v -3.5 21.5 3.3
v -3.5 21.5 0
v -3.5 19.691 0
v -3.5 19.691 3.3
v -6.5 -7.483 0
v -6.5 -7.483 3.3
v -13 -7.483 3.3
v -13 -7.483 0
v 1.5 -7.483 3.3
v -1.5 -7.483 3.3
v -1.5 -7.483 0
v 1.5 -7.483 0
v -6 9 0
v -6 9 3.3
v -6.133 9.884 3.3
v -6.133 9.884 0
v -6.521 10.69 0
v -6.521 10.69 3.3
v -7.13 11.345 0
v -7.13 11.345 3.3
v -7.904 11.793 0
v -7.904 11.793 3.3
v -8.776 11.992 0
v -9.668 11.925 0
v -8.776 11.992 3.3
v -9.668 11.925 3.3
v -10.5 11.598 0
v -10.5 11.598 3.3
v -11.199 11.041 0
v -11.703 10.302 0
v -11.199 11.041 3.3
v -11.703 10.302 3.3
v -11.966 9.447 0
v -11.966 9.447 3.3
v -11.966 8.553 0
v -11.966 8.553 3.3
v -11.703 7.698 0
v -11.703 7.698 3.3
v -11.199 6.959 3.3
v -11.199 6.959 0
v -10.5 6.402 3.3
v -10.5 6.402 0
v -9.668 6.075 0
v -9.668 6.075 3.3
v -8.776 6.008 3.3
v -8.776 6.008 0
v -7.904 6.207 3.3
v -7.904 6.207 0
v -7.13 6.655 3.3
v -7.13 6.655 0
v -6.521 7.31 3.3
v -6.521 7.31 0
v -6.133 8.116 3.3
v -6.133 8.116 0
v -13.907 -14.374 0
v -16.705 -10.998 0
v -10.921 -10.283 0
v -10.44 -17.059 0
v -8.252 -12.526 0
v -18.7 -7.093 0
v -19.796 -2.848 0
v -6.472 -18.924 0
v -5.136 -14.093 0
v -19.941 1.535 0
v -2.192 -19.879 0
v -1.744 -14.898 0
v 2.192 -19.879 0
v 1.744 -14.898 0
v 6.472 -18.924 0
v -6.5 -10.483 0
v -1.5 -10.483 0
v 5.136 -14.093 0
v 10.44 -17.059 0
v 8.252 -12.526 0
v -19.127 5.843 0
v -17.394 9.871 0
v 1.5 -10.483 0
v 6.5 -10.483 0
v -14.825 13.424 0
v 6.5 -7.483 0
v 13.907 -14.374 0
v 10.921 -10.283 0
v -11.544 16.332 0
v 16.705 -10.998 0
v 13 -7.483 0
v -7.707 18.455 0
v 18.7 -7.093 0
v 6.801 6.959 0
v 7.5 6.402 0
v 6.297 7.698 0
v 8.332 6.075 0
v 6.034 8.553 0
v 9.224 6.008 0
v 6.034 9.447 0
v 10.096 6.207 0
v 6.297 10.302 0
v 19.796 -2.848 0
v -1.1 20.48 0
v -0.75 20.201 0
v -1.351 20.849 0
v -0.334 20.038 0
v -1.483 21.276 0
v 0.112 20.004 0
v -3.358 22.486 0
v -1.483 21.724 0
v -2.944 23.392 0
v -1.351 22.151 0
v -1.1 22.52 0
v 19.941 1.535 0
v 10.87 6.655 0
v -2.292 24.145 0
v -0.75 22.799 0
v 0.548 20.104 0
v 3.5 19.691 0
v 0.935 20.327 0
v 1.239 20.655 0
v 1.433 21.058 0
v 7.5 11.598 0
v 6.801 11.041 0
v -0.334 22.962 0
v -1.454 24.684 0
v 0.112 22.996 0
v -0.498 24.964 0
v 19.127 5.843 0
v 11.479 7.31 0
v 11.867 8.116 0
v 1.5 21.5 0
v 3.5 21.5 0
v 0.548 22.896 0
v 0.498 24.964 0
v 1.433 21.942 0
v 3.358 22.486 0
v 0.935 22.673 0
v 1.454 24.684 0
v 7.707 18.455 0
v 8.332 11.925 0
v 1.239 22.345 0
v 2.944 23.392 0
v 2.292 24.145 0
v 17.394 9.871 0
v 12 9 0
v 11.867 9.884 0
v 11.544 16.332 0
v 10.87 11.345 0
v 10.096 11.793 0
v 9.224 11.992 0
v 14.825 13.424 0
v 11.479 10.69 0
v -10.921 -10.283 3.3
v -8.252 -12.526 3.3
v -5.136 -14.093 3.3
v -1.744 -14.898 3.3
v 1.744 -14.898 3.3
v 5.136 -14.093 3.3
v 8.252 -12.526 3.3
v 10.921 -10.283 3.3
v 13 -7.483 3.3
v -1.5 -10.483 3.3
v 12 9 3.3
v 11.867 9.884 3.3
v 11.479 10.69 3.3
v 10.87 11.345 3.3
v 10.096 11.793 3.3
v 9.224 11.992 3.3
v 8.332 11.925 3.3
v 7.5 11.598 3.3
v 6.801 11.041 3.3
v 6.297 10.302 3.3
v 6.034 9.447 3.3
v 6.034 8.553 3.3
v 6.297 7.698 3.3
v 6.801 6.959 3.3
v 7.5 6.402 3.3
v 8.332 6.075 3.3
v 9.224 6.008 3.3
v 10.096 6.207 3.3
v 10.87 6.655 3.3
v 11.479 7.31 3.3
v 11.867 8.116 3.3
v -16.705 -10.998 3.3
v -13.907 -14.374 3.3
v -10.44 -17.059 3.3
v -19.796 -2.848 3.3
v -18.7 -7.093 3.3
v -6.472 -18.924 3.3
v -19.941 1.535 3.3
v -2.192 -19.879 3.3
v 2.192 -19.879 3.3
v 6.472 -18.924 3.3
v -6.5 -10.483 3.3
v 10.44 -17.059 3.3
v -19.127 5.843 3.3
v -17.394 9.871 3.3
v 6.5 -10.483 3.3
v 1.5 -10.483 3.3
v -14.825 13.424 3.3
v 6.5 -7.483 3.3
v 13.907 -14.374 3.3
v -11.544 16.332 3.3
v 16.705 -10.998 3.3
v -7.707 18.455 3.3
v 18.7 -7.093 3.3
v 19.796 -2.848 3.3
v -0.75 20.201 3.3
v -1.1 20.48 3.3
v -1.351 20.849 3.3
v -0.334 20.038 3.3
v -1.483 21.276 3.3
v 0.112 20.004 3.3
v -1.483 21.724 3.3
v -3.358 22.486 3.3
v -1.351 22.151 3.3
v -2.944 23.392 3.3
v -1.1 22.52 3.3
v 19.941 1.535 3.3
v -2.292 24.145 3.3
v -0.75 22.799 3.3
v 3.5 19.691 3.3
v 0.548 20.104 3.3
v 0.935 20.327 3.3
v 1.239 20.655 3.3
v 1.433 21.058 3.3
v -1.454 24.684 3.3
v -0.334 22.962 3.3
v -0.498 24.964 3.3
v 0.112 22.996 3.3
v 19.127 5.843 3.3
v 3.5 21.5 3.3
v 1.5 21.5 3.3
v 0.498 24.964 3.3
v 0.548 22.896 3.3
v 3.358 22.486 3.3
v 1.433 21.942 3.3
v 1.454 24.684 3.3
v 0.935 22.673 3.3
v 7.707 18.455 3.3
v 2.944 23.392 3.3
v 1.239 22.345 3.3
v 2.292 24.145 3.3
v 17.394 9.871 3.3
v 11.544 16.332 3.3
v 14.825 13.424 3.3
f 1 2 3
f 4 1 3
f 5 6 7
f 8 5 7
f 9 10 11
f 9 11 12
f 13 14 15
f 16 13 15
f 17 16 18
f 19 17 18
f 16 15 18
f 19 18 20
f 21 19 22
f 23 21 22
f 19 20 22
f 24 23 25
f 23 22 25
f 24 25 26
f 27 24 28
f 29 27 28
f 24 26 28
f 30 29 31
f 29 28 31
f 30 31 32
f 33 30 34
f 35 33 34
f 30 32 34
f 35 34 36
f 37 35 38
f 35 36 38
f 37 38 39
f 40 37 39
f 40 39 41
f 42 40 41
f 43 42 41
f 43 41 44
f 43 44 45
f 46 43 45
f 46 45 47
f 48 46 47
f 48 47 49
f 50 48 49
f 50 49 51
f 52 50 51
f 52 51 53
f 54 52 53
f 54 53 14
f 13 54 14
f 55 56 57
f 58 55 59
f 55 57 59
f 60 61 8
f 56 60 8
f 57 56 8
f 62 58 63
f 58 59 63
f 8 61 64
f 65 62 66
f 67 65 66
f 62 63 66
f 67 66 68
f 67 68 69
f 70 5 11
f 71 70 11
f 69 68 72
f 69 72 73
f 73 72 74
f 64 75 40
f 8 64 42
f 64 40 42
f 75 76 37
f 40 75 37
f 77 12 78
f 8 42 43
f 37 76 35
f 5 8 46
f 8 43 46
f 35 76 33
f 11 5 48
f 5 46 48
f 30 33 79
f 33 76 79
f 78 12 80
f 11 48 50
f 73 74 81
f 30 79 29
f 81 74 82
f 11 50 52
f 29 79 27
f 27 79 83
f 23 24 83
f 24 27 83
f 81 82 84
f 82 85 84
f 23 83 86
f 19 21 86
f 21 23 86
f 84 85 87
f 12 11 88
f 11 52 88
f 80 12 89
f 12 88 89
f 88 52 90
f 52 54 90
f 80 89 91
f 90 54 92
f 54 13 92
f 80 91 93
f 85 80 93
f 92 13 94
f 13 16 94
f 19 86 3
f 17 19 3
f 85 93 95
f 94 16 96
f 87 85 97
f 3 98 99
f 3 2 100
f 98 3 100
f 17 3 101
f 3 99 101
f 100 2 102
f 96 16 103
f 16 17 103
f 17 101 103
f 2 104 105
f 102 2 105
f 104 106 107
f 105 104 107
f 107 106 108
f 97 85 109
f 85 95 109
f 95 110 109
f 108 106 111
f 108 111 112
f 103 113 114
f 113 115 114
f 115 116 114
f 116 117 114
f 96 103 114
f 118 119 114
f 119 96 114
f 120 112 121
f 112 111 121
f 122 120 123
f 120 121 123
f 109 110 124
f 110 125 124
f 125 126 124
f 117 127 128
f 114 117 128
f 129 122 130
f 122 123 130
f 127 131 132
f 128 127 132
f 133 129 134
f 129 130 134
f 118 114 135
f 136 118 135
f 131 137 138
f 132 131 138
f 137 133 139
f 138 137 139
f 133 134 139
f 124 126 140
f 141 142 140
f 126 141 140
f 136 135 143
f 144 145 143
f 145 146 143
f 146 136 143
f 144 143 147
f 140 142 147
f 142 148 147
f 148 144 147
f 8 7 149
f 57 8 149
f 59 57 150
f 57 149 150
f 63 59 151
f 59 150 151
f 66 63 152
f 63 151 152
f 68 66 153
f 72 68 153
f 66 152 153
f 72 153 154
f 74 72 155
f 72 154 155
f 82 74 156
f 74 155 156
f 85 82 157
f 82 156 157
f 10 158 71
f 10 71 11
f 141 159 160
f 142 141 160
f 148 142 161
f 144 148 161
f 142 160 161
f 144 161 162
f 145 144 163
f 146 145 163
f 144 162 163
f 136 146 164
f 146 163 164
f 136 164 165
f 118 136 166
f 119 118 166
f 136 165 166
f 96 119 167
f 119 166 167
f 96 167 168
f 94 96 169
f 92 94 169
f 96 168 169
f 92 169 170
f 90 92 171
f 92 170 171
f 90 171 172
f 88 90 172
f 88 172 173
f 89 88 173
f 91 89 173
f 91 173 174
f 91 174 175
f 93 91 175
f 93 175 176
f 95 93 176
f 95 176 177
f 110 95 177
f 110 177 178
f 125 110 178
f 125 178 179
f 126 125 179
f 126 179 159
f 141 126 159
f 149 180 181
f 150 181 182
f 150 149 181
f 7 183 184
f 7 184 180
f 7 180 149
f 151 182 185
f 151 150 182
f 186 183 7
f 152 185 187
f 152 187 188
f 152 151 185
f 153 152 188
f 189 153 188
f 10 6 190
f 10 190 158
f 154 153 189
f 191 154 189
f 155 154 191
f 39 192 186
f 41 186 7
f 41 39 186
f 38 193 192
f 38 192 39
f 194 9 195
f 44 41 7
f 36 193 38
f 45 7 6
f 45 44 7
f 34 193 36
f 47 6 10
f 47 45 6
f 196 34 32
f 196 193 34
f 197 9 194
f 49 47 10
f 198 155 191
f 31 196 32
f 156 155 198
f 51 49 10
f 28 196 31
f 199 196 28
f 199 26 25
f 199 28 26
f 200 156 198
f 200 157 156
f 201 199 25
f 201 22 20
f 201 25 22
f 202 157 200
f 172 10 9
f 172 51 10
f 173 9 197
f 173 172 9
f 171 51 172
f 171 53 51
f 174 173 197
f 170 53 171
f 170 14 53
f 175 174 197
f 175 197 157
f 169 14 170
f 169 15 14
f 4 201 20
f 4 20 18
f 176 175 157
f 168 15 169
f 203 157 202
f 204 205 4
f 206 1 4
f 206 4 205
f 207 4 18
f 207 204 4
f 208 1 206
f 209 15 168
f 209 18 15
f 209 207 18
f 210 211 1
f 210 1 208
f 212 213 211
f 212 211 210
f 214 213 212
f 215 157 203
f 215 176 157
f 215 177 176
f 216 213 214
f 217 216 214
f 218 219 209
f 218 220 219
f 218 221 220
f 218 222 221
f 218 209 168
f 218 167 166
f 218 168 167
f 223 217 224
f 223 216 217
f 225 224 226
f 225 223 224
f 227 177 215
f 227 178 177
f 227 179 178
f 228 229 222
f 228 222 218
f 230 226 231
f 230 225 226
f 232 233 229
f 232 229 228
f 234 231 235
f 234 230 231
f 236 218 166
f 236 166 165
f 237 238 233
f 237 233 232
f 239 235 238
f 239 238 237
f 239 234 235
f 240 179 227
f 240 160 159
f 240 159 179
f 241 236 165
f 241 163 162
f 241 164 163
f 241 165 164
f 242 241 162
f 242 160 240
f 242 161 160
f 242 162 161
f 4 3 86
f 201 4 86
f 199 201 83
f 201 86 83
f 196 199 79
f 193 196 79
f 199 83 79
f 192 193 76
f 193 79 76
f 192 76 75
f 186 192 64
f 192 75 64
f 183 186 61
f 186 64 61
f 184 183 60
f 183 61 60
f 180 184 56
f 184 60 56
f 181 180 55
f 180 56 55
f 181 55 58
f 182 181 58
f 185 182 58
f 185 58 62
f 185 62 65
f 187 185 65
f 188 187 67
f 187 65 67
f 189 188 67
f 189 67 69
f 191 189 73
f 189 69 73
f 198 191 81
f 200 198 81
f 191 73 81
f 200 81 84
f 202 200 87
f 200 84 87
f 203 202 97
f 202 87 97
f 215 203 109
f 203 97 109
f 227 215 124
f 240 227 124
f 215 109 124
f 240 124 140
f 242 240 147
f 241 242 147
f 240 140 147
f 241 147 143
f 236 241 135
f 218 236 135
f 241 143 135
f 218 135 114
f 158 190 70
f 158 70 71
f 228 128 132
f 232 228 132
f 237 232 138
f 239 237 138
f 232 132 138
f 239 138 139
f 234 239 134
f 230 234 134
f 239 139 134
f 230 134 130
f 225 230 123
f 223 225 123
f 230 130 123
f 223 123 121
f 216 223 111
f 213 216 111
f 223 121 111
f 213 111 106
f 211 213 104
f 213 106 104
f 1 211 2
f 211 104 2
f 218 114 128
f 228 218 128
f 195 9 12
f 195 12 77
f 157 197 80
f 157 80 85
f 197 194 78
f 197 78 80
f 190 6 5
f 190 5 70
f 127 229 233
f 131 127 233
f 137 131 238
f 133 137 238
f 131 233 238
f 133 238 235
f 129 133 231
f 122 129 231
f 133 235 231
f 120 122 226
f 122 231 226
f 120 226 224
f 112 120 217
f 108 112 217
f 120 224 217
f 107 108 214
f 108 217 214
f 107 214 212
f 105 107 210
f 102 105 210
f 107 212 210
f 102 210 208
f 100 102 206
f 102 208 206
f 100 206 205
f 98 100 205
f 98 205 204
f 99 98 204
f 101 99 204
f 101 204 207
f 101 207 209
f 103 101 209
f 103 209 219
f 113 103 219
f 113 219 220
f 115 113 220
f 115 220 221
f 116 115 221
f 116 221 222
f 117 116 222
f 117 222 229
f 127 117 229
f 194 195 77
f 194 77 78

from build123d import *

# Parameters (mm, degrees)
EXTRUDE_DEPTH   = 3.3
SKETCH001_R     = 1.5
POCKET_DEPTH    = 3.301
SKETCH002_R     = 3
POCKET001_DEPTH = 5


with BuildPart() as part:
    # Sketch → Extrude (new body)
    with BuildSketch(Plane.XY):
        with BuildLine():
            ThreePointArc((3.5, 21.5), (0, 25), (-3.5, 21.5))
            Line((-3.5, 21.5), (-3.5, 19.691369))
            ThreePointArc((-3.5, 19.691369), (0, -20), (3.5, 19.691369))
            Line((3.5, 19.691369), (3.5, 21.5))
        make_face()
    extrude(amount=EXTRUDE_DEPTH)

    # Sketch001 (on Face6 of Extrude) → Pocket (cut, through all)
    with BuildSketch(Plane.XY.offset(3.3)):
        with Locations((0, 21.5)):
            Circle(SKETCH001_R)
    extrude(amount=-POCKET_DEPTH, mode=Mode.SUBTRACT)

    # Sketch002 (on Face6 of BaseFeature) → Pocket001 (cut)
    with BuildSketch(Plane.XY.offset(3.3)):
        with Locations((9, 9)):
            Circle(SKETCH002_R)
        with Locations((-9, 9)):
            Circle(SKETCH002_R)
        with BuildLine():
            ThreePointArc((-13, -7.483315), (0, -15), (13, -7.483315))
            Line((6.5, -7.483315), (13, -7.483315))
            Line((6.5, -10.483315), (6.5, -7.483315))
            Line((1.5, -10.483315), (6.5, -10.483315))
            Line((1.5, -7.483315), (1.5, -10.483315))
            Line((-1.5, -7.483315), (1.5, -7.483315))
            Line((-1.5, -10.483315), (-1.5, -7.483315))
            Line((-6.5, -10.483315), (-1.5, -10.483315))
            Line((-6.5, -7.483315), (-6.5, -10.483315))
            Line((-6.5, -7.483315), (-13, -7.483315))
        make_face()
    extrude(amount=-POCKET001_DEPTH, mode=Mode.SUBTRACT)


solid = part.part
